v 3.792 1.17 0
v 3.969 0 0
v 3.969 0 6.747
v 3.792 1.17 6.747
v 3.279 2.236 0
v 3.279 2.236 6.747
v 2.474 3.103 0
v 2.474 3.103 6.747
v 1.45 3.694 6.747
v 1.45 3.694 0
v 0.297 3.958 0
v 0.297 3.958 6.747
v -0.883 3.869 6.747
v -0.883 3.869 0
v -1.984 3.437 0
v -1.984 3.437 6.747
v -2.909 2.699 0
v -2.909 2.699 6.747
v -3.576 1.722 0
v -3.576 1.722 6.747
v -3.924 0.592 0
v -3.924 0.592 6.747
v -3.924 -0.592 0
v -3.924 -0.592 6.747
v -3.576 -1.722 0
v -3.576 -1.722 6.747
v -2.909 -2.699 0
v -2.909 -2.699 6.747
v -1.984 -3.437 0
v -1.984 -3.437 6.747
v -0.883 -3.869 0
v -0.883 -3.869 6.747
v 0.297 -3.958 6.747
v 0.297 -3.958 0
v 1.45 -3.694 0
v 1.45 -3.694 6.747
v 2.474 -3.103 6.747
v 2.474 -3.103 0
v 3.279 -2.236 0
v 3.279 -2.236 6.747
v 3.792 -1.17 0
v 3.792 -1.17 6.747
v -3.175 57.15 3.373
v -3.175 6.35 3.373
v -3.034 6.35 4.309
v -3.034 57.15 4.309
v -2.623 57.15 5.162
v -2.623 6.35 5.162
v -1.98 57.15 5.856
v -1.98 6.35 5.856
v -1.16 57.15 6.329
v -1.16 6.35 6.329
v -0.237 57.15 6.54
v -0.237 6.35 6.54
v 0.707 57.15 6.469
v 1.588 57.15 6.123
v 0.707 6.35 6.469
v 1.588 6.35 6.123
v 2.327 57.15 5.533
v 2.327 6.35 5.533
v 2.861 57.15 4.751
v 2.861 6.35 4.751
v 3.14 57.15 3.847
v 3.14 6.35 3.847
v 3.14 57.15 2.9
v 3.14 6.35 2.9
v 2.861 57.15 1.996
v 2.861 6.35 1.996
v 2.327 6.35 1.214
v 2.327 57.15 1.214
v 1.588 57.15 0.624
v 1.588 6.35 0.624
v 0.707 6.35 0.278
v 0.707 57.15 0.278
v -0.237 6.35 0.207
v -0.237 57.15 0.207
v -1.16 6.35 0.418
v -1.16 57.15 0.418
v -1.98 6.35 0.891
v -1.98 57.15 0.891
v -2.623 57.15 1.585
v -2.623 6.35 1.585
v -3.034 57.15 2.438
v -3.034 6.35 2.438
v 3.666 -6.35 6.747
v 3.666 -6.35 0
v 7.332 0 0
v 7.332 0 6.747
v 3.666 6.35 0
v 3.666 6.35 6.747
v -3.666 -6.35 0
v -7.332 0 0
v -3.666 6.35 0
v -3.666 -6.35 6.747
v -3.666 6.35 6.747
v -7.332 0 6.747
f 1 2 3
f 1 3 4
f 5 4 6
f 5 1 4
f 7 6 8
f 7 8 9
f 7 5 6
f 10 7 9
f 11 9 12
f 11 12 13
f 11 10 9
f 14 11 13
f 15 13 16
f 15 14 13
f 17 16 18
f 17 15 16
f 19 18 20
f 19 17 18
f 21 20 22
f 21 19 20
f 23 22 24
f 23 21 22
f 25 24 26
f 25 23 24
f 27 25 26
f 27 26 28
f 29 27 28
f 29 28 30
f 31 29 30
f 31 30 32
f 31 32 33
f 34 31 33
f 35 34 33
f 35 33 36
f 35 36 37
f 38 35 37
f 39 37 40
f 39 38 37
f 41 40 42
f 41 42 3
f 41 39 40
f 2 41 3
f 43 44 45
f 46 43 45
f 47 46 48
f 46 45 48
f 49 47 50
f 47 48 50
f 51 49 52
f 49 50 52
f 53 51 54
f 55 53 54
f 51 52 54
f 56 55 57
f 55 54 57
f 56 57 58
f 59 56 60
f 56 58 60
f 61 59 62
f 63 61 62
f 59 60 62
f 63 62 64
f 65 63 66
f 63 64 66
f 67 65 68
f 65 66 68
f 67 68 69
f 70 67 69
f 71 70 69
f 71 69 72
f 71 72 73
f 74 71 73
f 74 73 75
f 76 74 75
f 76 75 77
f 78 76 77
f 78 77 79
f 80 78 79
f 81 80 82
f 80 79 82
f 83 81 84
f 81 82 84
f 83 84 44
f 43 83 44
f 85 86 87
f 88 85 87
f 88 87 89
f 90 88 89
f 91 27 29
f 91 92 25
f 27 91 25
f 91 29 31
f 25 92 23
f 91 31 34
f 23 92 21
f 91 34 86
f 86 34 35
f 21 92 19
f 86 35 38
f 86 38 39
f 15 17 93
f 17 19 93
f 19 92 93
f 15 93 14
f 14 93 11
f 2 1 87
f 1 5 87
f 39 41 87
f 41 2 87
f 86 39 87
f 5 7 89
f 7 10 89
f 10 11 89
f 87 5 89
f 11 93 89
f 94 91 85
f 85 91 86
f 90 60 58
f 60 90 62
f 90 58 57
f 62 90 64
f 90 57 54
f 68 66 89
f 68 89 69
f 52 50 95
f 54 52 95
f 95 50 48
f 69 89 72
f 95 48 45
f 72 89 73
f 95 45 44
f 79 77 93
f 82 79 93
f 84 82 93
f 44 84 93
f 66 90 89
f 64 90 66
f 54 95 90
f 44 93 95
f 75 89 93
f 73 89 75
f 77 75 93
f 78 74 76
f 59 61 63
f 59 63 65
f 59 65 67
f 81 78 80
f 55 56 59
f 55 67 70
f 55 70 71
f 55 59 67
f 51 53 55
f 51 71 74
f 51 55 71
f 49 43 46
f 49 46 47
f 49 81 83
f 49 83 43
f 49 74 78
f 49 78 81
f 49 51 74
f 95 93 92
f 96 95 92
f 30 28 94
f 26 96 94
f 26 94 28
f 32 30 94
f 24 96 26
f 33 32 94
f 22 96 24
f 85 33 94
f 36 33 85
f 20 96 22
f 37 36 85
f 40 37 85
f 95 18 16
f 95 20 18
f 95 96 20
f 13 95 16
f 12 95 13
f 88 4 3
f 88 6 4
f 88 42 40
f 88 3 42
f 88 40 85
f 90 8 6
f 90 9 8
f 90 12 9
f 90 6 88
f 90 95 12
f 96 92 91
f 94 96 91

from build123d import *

# Parameters (mm, degrees)
F0_R     = 3.96875
F1_DEPTH = 6.746875
F2_R     = 3.175
F3_DEPTH = 50.8


with BuildPart() as f1:
    # F0 (on Top) → F1 (new body)
    with BuildSketch(Plane.XY):
        Polygon((3.666174, 6.35), (-3.666174, 6.35), (-7.332348, 0), (-3.666174, -6.35), (3.666174, -6.35), (7.332348, 0), align=None)
        Circle(F0_R, mode=Mode.SUBTRACT)
    extrude(amount=F1_DEPTH)

    # F2 (on face) → F3 (join)
    with BuildSketch(Plane(origin=(0, 6.35, 0), x_dir=(-1, 0, 0), z_dir=(0, 1, 0))):
        with Locations((0, 3.373438)):
            Circle(F2_R)
    extrude(amount=F3_DEPTH)


solid = f1.part
